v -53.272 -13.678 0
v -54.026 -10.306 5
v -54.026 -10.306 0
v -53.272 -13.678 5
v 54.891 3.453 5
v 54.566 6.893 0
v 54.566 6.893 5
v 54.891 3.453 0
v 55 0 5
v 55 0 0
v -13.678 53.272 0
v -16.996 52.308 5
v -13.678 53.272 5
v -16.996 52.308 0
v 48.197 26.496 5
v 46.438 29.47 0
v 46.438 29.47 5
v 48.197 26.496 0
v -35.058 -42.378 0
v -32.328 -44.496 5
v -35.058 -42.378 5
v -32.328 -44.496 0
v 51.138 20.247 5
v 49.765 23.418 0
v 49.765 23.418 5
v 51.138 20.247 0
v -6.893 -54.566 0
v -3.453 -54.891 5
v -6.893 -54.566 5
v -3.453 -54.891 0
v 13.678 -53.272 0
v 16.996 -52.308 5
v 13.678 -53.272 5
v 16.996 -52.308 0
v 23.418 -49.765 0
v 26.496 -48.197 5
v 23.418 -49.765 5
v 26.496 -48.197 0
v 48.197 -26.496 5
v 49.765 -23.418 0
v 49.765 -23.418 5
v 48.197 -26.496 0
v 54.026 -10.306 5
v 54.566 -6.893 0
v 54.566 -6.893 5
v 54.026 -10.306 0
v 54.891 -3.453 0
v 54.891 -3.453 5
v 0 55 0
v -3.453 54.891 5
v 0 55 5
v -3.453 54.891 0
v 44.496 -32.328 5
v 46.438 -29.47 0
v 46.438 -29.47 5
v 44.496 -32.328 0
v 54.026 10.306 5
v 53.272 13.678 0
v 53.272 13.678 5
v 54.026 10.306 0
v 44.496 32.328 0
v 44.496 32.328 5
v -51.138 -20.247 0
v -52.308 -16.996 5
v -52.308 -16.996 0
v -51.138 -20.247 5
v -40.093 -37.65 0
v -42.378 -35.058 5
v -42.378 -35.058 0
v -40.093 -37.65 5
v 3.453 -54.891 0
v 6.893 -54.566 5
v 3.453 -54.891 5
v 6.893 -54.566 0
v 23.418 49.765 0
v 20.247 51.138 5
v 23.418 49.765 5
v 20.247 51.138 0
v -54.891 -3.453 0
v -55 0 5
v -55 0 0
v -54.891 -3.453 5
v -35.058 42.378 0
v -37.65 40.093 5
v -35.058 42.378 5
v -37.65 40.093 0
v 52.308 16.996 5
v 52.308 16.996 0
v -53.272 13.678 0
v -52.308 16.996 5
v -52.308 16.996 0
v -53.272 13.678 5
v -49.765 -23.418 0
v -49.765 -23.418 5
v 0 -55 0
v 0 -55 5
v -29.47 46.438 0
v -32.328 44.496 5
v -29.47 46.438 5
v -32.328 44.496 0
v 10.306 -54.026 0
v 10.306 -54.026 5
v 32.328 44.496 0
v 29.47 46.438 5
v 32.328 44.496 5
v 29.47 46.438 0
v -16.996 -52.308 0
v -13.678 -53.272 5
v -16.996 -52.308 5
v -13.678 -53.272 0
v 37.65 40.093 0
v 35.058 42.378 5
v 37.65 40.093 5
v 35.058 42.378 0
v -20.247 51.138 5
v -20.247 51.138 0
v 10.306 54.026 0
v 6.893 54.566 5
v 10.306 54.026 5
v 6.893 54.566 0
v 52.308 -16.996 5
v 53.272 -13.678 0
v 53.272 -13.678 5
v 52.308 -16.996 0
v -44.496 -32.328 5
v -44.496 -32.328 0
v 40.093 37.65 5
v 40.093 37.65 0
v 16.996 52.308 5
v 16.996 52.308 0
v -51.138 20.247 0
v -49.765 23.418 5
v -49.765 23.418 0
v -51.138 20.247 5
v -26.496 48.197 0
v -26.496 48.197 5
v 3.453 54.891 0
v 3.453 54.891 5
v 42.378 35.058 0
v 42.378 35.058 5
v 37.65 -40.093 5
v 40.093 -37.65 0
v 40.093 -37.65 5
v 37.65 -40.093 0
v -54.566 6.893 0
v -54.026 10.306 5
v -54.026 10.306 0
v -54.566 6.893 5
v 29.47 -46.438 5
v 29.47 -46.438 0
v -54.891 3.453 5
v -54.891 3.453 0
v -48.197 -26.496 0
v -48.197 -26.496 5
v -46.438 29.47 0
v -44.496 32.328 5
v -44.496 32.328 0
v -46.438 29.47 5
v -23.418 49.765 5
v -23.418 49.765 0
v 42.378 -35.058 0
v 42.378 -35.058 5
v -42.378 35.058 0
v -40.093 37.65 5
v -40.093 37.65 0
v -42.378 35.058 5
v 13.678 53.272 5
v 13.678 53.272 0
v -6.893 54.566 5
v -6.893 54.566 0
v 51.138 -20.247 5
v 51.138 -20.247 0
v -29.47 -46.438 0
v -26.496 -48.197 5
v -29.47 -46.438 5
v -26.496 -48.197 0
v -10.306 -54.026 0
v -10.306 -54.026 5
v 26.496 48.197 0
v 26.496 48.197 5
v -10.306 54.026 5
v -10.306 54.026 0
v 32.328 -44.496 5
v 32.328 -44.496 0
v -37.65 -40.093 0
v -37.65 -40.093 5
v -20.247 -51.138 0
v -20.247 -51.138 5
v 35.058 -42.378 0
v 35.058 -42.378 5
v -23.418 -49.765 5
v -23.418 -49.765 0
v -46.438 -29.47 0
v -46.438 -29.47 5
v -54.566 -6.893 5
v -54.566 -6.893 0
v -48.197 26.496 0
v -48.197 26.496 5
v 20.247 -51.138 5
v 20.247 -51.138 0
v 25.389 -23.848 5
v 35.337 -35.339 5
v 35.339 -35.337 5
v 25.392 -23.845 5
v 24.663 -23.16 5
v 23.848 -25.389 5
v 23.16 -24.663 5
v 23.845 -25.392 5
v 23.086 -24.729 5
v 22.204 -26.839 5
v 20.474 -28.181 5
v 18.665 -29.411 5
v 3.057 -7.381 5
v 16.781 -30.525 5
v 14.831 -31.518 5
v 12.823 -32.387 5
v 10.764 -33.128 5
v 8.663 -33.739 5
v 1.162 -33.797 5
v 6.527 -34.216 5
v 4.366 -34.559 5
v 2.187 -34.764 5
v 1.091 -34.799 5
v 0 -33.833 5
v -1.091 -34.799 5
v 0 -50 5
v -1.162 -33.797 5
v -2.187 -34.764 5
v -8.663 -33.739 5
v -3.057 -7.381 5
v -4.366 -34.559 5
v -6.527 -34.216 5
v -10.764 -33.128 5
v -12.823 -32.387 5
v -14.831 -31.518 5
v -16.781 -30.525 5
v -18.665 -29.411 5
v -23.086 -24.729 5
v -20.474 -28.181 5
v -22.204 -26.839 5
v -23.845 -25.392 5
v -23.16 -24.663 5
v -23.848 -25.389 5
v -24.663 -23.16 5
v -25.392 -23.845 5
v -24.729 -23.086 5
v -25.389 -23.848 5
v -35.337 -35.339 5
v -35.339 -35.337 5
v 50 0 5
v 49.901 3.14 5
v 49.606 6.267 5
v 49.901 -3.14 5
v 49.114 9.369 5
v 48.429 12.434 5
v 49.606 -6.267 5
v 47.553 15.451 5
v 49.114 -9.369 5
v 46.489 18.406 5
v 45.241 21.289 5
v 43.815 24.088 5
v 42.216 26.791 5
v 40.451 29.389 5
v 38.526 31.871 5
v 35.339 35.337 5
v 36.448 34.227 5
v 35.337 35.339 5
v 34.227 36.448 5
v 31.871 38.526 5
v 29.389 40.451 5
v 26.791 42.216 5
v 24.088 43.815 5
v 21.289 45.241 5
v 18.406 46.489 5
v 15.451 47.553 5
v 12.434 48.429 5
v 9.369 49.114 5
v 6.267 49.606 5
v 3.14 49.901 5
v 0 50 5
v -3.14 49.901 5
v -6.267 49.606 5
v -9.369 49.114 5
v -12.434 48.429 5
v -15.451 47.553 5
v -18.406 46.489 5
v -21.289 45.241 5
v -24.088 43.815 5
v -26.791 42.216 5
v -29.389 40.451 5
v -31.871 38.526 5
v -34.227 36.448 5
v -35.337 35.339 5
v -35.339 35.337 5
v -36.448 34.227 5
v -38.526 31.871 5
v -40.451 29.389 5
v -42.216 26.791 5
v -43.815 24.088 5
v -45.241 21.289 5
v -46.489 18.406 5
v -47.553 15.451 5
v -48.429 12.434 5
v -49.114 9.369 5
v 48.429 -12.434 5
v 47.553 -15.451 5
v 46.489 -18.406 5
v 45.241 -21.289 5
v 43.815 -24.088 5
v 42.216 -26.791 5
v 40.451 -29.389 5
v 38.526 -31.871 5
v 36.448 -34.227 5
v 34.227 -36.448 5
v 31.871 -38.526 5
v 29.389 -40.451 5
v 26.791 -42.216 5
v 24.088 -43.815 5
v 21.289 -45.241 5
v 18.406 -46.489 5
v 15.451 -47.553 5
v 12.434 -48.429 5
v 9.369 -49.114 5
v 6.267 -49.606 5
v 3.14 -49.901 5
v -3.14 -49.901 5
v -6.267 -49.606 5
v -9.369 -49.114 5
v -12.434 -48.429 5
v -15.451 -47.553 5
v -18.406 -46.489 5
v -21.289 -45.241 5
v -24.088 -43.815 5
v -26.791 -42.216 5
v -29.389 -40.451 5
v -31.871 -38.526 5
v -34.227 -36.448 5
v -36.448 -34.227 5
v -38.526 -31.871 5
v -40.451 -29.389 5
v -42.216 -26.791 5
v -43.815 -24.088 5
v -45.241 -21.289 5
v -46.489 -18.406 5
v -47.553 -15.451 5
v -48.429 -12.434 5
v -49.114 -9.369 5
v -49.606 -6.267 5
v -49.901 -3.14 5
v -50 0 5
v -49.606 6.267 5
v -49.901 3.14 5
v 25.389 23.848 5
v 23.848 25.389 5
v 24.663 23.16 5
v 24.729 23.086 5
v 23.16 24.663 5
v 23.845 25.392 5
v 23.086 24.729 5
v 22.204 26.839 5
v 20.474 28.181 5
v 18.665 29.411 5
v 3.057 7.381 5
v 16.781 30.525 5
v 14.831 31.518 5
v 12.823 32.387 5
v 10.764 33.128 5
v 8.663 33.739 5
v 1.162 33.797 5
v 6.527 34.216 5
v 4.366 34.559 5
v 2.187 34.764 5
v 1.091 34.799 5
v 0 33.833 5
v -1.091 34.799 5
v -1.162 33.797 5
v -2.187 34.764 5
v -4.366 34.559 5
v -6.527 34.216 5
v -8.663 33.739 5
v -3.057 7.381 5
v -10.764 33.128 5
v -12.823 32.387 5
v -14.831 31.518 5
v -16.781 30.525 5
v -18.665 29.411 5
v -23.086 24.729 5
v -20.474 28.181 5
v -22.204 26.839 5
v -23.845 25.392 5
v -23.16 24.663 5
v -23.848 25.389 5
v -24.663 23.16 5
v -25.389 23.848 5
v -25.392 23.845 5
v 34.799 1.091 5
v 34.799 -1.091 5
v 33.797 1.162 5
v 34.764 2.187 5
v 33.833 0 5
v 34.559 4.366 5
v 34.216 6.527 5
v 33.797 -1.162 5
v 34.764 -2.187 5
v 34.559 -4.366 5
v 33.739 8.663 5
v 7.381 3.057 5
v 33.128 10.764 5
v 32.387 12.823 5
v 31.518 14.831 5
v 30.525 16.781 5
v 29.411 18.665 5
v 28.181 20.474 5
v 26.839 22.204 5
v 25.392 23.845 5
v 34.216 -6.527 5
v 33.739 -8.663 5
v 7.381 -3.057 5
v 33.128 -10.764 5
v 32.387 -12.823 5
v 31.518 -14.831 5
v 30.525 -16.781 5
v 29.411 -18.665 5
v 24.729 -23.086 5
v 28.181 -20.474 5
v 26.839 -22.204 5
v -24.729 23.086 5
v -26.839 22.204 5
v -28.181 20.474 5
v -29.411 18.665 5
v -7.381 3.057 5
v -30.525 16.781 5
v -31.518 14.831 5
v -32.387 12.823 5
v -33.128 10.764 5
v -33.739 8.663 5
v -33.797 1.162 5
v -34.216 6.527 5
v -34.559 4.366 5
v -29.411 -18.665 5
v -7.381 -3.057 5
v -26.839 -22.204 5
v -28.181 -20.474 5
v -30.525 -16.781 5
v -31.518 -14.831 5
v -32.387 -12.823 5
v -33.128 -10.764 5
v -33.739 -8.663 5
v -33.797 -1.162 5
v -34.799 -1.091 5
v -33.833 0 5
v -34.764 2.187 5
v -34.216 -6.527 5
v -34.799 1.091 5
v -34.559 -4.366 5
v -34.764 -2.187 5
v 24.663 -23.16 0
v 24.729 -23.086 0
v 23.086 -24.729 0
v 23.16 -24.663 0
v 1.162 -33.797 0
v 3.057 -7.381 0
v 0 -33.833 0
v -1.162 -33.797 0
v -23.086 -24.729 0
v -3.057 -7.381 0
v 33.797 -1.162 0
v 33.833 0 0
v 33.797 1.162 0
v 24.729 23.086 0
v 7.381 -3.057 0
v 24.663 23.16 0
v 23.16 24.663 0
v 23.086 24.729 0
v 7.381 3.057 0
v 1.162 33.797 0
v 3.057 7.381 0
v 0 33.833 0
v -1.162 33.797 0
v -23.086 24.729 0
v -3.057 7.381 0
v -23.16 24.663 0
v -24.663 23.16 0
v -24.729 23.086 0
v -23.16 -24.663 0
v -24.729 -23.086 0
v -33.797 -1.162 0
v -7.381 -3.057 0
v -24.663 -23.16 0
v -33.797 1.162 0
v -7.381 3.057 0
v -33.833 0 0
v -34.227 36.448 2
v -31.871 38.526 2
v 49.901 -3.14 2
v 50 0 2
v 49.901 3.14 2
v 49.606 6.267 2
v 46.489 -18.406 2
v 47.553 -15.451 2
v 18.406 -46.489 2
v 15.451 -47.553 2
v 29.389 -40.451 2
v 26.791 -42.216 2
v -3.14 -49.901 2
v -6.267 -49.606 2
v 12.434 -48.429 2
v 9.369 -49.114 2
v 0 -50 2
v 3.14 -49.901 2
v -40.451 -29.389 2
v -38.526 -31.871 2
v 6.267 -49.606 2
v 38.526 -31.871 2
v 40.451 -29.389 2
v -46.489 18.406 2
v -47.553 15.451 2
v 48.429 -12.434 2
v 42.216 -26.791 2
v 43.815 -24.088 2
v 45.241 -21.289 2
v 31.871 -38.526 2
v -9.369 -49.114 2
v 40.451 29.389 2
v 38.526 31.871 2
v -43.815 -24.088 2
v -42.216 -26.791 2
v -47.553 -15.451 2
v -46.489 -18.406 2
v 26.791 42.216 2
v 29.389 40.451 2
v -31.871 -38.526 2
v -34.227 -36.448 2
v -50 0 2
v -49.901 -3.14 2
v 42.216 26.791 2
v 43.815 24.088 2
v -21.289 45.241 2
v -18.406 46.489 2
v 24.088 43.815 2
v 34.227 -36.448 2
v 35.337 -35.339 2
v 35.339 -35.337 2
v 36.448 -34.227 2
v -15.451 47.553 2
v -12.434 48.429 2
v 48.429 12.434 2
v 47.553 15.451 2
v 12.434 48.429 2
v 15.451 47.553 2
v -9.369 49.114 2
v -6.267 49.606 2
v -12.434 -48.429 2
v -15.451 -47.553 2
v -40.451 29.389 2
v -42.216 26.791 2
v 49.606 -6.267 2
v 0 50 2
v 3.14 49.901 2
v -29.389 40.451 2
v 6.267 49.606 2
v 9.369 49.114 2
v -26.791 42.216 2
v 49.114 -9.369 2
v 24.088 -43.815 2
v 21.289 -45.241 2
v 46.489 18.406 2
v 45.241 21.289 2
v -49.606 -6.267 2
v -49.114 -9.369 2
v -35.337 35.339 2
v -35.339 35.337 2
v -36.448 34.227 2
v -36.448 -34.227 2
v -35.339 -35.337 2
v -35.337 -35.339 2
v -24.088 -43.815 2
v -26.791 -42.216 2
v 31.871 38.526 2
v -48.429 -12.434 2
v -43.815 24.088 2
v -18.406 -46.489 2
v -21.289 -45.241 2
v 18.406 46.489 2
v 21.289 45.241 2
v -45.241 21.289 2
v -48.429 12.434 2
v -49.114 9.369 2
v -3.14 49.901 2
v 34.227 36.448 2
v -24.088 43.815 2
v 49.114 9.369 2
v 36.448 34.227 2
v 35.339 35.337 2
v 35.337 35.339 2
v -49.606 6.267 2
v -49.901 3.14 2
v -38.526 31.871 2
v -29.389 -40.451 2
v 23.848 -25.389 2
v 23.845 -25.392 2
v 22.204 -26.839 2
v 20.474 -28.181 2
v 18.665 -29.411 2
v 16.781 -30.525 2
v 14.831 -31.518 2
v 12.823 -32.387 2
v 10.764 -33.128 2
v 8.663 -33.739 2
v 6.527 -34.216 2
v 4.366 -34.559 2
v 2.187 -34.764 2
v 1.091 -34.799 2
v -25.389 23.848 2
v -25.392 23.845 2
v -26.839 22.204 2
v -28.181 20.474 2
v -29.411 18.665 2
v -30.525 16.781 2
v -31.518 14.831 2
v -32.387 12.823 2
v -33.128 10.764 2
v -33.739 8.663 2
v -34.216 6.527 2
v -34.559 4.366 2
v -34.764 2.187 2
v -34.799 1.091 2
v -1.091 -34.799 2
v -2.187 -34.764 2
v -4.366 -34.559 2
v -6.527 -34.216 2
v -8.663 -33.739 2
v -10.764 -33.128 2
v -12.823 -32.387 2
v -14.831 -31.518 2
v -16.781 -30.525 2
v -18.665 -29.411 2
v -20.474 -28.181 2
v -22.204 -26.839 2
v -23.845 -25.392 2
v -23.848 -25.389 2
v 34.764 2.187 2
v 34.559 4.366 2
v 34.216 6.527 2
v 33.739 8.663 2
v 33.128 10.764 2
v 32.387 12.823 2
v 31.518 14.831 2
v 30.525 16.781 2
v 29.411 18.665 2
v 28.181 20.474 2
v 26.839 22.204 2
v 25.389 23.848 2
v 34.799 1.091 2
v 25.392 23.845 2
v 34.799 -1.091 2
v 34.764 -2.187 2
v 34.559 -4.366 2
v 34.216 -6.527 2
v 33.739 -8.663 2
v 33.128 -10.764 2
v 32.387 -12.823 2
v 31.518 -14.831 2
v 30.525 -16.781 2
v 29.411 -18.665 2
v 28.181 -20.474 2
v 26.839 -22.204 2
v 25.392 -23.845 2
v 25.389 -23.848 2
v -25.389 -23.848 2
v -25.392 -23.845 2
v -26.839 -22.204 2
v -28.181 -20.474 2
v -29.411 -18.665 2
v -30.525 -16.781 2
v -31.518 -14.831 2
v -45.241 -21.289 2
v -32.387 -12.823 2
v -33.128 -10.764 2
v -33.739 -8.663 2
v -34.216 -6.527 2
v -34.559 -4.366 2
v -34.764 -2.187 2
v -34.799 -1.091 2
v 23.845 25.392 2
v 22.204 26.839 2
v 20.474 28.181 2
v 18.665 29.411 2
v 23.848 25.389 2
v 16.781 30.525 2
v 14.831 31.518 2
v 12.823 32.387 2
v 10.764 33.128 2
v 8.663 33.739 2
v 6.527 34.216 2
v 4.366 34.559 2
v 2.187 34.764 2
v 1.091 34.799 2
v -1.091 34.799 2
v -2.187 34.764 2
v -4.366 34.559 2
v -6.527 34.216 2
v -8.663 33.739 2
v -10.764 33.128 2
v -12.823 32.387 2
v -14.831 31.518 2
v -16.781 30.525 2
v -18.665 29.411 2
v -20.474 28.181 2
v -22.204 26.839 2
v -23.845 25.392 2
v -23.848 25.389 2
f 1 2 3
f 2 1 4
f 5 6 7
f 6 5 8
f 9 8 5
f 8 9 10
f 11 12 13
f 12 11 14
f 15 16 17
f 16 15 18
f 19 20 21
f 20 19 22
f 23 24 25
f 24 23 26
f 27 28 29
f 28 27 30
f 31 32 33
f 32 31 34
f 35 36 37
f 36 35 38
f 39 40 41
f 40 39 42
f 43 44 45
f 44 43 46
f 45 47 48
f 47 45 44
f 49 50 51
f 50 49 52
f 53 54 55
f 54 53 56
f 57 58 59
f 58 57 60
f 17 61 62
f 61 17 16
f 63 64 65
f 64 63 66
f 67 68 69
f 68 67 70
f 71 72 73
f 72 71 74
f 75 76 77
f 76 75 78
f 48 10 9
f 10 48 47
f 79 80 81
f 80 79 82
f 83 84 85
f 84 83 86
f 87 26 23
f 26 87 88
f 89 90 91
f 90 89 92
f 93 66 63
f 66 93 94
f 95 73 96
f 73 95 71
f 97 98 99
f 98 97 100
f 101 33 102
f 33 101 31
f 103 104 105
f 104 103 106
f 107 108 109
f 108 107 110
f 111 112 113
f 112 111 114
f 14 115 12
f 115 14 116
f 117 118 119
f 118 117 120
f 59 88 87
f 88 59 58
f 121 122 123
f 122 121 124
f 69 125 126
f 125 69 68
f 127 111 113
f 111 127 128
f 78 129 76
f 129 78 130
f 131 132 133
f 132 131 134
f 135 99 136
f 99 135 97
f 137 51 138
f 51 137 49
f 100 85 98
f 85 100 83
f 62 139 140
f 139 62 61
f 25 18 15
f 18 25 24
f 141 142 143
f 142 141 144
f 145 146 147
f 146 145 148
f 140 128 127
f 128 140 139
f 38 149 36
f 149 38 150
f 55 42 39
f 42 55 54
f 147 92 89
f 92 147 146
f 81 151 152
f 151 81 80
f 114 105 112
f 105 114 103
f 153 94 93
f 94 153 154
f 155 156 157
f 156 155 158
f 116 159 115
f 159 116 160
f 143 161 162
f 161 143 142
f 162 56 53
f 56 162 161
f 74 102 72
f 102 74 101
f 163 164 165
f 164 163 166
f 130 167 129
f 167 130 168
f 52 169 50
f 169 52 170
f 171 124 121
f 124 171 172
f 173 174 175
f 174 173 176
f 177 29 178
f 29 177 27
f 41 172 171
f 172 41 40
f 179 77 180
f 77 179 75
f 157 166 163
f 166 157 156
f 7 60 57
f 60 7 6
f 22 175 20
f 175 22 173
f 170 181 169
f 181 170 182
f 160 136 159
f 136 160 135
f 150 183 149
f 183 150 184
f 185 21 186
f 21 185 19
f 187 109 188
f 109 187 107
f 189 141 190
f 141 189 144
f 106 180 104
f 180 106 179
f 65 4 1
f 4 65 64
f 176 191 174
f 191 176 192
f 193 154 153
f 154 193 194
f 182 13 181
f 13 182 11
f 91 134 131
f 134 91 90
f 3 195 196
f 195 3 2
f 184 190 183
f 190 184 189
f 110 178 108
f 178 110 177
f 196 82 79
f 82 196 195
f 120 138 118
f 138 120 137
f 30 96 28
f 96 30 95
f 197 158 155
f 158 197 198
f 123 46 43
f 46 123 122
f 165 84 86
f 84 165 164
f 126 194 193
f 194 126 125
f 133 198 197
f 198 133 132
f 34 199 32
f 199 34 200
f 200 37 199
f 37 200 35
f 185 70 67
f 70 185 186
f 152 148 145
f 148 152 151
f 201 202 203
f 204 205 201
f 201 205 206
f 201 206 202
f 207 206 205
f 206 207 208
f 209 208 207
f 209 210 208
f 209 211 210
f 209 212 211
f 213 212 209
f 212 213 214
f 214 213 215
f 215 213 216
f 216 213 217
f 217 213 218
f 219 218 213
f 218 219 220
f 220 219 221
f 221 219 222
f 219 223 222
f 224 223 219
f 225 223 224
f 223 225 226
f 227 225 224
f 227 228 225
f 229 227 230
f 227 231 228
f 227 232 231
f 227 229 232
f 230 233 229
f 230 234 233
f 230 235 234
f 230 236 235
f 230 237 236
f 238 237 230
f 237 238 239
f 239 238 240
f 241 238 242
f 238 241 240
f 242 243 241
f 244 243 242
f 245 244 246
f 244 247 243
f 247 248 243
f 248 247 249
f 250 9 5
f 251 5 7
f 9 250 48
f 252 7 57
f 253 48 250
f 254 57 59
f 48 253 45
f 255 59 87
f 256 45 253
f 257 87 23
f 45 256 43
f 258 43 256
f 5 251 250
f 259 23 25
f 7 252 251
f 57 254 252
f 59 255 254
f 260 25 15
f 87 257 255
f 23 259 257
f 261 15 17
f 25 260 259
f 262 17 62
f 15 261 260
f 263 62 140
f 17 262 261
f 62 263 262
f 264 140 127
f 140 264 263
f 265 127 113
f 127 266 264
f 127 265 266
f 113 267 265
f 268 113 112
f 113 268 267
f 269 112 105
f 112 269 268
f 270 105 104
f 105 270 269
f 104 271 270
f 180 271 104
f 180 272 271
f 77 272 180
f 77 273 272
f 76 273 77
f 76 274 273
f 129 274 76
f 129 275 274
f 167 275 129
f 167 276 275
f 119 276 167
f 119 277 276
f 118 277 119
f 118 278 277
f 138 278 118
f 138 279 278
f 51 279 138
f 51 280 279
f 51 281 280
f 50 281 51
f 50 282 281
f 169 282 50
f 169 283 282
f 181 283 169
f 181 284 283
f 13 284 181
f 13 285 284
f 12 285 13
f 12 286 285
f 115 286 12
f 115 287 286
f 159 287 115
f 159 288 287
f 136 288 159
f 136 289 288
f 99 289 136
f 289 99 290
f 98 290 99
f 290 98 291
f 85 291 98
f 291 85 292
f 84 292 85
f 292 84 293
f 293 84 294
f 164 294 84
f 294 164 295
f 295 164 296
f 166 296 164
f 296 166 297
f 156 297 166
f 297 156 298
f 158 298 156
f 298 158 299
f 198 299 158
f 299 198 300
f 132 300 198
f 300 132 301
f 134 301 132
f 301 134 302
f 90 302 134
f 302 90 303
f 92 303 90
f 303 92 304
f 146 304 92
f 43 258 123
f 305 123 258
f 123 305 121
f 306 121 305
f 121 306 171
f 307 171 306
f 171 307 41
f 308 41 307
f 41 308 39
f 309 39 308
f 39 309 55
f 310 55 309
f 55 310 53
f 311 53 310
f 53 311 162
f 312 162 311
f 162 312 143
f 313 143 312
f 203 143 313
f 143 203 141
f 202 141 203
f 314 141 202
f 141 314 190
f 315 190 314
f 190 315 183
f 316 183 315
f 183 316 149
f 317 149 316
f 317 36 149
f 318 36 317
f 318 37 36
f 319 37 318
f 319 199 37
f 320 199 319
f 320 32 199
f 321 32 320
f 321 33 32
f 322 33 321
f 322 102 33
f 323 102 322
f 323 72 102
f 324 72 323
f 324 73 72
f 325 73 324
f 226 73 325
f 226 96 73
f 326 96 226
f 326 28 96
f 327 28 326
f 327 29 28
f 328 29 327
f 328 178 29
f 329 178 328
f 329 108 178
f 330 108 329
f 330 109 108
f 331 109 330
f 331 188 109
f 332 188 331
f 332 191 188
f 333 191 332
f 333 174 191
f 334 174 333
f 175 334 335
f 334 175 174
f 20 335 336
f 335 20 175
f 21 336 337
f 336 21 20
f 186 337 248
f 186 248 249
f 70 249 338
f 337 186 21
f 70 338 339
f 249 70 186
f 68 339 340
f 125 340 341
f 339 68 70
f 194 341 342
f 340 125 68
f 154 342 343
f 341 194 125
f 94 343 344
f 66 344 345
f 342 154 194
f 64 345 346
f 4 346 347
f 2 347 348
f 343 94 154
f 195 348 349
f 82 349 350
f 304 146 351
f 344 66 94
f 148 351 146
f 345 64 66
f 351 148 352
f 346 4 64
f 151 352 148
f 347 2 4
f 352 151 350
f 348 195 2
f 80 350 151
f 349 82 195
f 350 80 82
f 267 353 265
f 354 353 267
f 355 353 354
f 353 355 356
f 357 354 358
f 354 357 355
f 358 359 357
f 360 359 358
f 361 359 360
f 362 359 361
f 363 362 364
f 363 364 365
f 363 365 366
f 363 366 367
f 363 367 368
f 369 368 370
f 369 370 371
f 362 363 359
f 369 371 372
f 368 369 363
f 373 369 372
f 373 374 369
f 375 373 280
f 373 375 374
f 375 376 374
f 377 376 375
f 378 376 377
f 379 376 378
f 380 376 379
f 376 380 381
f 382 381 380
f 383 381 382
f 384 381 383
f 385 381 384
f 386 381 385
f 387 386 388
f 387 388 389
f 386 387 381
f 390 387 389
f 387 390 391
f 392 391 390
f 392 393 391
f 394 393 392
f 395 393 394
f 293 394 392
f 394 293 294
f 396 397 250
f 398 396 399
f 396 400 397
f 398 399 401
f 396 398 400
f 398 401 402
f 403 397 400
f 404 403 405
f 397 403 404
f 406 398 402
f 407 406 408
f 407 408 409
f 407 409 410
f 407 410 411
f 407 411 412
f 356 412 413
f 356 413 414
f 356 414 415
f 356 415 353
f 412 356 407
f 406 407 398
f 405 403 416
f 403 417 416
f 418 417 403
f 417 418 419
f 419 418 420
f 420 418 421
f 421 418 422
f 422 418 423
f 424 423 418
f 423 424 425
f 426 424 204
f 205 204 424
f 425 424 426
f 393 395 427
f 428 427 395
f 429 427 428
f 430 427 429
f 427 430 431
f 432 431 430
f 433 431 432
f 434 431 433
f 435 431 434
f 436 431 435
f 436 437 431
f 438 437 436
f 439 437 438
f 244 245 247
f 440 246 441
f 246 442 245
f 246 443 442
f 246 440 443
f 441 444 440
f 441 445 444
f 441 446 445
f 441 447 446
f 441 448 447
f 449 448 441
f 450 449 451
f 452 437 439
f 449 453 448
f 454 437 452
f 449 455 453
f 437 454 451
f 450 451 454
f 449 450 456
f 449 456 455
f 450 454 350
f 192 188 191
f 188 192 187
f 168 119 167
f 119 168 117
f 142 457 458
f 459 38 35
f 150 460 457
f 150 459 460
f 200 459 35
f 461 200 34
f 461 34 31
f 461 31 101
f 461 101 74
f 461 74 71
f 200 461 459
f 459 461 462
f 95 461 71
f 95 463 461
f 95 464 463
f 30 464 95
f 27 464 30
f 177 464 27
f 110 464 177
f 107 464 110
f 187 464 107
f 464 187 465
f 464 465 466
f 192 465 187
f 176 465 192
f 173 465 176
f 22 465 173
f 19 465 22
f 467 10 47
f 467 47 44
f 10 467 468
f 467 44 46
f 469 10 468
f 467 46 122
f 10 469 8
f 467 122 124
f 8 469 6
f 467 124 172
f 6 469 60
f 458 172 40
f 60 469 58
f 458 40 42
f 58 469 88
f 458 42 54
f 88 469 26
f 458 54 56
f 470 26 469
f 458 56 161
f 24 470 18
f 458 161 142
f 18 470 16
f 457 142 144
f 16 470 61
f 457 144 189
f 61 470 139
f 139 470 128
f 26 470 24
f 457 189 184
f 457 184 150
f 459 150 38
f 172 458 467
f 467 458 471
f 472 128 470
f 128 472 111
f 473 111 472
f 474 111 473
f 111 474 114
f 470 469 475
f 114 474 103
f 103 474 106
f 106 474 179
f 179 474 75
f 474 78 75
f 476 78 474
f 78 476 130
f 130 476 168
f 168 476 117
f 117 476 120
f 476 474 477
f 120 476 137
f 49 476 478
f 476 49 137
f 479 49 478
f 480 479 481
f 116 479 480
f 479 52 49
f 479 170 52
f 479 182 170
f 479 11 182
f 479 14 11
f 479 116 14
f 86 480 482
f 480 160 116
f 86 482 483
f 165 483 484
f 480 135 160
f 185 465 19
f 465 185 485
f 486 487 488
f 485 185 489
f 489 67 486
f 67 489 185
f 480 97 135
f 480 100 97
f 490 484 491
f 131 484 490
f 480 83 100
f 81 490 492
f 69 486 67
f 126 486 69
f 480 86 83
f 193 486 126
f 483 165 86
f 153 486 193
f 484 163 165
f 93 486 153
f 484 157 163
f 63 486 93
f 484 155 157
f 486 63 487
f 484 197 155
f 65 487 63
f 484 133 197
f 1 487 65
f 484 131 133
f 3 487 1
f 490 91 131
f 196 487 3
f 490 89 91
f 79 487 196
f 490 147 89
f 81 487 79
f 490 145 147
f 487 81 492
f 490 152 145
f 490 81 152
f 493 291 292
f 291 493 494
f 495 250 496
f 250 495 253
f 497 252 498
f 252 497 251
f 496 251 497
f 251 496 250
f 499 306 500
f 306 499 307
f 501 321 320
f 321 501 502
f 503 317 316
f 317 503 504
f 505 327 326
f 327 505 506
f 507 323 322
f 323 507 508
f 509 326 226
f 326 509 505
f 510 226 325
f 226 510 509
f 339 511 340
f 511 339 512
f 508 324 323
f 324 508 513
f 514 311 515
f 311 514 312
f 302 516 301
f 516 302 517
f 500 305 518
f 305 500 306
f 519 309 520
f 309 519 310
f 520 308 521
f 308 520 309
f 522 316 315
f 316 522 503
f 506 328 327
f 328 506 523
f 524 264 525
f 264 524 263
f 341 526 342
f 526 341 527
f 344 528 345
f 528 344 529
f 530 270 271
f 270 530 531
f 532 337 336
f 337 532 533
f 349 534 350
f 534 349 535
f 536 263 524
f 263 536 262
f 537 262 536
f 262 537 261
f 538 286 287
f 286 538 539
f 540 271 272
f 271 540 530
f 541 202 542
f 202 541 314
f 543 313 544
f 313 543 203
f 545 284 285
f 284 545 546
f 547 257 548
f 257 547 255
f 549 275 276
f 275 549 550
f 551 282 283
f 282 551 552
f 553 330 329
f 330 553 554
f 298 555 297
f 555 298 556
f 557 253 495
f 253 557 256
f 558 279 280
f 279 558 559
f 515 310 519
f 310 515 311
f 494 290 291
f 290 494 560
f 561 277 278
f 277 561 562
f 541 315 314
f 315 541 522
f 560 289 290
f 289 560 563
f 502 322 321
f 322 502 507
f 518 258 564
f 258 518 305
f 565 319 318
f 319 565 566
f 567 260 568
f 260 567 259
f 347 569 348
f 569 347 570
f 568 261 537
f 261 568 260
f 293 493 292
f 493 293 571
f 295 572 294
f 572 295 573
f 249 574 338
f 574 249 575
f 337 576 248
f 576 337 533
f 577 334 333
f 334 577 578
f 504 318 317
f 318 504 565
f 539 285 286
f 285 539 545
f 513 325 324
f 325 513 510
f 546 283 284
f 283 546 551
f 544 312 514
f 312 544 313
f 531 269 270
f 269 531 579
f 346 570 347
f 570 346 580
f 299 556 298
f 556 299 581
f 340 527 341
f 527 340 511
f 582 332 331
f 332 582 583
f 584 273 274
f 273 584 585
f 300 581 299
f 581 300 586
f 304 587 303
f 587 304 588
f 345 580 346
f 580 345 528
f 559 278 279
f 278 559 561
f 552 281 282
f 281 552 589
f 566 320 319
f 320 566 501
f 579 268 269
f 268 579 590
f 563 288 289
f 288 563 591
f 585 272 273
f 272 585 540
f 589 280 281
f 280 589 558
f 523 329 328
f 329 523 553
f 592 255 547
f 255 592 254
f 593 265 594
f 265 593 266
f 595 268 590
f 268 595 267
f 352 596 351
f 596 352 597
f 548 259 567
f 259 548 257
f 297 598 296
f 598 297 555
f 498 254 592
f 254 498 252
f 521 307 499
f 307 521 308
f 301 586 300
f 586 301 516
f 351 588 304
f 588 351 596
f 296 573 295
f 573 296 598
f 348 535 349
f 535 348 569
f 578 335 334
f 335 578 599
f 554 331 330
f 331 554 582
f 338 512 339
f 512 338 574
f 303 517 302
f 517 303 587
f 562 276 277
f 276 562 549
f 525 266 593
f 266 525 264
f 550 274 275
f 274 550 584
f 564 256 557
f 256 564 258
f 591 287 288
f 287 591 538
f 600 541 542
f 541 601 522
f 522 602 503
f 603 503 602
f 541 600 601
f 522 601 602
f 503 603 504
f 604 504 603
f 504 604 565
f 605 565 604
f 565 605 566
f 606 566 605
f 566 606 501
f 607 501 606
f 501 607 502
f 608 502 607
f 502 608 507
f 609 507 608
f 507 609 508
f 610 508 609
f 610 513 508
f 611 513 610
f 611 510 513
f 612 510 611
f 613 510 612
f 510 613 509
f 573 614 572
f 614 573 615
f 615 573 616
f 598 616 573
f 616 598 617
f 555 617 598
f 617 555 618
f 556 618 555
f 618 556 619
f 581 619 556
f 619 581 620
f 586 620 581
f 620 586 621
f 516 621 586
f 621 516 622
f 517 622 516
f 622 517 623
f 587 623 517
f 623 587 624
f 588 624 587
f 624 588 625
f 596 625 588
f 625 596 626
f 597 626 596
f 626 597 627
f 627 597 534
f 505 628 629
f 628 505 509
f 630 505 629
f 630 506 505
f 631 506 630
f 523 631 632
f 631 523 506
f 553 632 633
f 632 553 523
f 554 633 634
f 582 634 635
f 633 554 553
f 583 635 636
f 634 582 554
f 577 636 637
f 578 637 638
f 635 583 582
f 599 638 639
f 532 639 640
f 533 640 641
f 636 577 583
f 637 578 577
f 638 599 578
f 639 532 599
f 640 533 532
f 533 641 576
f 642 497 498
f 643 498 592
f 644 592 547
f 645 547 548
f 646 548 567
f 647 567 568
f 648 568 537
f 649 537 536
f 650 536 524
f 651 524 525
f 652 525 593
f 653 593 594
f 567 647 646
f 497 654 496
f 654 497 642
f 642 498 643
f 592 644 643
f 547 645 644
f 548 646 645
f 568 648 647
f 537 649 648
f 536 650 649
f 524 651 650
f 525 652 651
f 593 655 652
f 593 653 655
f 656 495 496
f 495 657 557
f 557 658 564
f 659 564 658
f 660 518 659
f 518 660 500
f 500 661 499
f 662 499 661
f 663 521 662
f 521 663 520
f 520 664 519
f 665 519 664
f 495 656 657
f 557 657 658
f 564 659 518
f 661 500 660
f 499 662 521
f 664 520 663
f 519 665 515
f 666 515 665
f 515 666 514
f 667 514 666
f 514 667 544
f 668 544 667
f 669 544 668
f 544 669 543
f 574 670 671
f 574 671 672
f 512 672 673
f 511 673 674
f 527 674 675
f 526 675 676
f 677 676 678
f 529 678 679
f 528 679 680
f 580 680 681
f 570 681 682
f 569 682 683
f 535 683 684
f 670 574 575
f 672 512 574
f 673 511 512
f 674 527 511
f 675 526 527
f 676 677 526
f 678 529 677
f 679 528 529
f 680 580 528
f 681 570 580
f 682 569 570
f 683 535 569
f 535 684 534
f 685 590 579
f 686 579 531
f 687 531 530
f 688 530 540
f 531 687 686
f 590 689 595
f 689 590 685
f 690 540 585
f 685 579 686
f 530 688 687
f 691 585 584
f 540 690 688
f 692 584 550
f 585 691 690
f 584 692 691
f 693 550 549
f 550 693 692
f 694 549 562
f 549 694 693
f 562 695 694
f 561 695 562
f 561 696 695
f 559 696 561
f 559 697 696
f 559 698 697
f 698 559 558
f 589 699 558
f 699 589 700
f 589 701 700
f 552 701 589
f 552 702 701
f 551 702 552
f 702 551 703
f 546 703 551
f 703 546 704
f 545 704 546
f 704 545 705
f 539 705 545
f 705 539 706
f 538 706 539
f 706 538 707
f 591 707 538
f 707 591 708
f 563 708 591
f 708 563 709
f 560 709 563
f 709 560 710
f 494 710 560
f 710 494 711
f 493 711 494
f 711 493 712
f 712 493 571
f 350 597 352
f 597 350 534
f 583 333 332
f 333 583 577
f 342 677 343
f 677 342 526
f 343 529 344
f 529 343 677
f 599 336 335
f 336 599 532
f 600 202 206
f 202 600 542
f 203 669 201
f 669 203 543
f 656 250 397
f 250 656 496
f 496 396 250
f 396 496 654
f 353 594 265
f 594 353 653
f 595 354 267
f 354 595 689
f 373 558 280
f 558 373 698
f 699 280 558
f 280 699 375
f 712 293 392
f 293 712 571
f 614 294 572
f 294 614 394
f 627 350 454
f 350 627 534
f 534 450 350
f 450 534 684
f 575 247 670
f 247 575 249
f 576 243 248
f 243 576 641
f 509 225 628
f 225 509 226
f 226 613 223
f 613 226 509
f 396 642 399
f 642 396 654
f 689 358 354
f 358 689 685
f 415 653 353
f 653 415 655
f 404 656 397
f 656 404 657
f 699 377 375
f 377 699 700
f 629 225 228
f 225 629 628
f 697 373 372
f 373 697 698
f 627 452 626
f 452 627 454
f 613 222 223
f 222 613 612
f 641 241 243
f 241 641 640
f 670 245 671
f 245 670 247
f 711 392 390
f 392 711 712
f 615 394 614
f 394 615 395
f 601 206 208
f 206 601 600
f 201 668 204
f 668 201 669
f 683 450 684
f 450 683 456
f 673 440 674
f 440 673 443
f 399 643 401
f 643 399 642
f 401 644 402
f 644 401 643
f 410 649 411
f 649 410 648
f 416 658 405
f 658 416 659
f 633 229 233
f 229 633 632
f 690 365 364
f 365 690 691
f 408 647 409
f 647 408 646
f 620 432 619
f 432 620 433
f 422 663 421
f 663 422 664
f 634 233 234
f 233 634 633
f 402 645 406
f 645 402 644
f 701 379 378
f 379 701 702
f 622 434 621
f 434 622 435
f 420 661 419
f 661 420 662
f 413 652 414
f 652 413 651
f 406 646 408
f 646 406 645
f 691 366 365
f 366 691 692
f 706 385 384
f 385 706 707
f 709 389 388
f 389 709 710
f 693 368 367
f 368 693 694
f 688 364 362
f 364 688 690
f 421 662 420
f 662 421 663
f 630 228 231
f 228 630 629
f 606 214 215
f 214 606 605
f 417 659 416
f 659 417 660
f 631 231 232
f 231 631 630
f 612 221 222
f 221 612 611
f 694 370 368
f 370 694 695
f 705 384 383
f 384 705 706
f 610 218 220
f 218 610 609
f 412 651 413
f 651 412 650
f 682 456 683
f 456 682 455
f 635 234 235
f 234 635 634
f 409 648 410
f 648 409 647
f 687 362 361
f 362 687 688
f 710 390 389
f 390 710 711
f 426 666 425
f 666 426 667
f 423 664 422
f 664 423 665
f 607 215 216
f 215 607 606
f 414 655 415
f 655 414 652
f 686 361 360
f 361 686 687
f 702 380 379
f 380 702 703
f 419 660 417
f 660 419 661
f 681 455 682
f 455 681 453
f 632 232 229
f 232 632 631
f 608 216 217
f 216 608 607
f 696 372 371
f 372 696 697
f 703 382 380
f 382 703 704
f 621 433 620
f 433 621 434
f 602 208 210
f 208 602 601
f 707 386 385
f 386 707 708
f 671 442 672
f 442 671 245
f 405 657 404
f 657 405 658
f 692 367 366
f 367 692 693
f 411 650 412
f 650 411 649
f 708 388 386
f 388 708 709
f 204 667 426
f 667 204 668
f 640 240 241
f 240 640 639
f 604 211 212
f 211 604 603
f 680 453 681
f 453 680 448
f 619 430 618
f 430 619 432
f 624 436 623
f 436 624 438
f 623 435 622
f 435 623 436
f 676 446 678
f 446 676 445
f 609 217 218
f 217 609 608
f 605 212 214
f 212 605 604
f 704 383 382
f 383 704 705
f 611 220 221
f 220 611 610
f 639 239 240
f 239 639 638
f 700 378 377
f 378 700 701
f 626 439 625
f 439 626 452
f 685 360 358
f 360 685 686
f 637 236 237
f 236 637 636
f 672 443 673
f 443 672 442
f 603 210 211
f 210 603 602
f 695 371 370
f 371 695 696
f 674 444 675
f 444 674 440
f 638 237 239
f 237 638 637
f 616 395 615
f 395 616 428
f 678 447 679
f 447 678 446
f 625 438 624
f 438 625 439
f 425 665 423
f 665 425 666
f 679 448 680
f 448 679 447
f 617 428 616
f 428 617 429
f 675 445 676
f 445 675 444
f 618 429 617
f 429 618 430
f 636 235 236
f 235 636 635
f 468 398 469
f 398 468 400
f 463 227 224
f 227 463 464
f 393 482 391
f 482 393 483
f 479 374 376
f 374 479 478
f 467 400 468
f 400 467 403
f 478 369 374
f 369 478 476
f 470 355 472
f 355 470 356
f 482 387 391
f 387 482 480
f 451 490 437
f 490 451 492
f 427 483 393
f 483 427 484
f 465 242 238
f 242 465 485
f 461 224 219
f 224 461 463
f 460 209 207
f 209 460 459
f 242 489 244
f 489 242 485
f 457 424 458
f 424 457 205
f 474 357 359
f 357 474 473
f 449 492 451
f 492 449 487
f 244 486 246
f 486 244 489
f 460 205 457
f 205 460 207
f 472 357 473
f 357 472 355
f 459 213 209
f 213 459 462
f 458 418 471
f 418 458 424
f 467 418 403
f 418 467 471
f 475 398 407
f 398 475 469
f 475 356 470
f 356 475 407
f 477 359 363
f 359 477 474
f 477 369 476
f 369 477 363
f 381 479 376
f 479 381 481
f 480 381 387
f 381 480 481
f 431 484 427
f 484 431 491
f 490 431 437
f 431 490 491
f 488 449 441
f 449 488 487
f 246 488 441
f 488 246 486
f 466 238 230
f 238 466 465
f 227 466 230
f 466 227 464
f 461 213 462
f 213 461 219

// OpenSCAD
coasterRadius = 55; // [40, 45, 50, 55, 60]
coasterHeight = 5; // [4, 5, 6, 7]
rimWidth = 5; // [4, 5, 6]
numPoints = 8; // [4, 5, 6, 7, 8, 9, 10]


// coaster body
difference()
{
    union()
    {
        difference()
        {
            cylinder(coasterHeight,coasterRadius,coasterRadius);
            translate([0,0,2])
            cylinder(coasterHeight,innerRadius,innerRadius);
        }
        cylinder(coasterHeight,circleRadius,circleRadius);
        starTips(numPoints,coasterHeight,innerRadius,innerLogoRadius,circleRadius);
    }
    translate([0,0,-1])
    cutout(numPoints,coasterHeight + 2,innerRadius,innerLogoRadius,circleRadius-1);
}


module cutout(numPoints = 8, height = 4 ,outerRad = 50, innerRad = 20, circleRad=40)
{
    intersection()
    {
        cylinder(height ,circleRad,circleRad);
        translate([0,0,-.5])
        star(numPoints,height,outerRad,innerRad);    
    }
}

module star(numPoints = 8, height = 4 ,outerRad = 50, innerRad = 20) 
{
    
    totalPoints = numPoints * 2;
    increment = 360/totalPoints;
    
    function getPoint(a,r) = ([sin(a) * r, cos(a) * r]);
        
    points = [ for(a=[0:increment:361 - increment]) (getPoint(a,((a % (increment * 2)) <= .01? outerRad : innerRad)))];
    echo(points);
    linear_extrude(height,convexity = 20)
    polygon(points);
}


//Star Tips
module starTips(numPoints = 8, height = 4 ,outerRad = 50, innerRad = 20, circleRad=40)
{
    difference()
    {
        star(numPoints,height,outerRad,innerRad);    
        translate([0,0,-.1])
        cylinder(height + 1,circleRad,circleRad);
    }
}

$fn=100;
m1 = 0.159789289; // inner logo multiplier
m2 = 0.69666374; // logo circle multiplier

innerRadius = coasterRadius - rimWidth;
circleRadius = m2 * innerRadius;
innerLogoRadius = m1 * innerRadius;
